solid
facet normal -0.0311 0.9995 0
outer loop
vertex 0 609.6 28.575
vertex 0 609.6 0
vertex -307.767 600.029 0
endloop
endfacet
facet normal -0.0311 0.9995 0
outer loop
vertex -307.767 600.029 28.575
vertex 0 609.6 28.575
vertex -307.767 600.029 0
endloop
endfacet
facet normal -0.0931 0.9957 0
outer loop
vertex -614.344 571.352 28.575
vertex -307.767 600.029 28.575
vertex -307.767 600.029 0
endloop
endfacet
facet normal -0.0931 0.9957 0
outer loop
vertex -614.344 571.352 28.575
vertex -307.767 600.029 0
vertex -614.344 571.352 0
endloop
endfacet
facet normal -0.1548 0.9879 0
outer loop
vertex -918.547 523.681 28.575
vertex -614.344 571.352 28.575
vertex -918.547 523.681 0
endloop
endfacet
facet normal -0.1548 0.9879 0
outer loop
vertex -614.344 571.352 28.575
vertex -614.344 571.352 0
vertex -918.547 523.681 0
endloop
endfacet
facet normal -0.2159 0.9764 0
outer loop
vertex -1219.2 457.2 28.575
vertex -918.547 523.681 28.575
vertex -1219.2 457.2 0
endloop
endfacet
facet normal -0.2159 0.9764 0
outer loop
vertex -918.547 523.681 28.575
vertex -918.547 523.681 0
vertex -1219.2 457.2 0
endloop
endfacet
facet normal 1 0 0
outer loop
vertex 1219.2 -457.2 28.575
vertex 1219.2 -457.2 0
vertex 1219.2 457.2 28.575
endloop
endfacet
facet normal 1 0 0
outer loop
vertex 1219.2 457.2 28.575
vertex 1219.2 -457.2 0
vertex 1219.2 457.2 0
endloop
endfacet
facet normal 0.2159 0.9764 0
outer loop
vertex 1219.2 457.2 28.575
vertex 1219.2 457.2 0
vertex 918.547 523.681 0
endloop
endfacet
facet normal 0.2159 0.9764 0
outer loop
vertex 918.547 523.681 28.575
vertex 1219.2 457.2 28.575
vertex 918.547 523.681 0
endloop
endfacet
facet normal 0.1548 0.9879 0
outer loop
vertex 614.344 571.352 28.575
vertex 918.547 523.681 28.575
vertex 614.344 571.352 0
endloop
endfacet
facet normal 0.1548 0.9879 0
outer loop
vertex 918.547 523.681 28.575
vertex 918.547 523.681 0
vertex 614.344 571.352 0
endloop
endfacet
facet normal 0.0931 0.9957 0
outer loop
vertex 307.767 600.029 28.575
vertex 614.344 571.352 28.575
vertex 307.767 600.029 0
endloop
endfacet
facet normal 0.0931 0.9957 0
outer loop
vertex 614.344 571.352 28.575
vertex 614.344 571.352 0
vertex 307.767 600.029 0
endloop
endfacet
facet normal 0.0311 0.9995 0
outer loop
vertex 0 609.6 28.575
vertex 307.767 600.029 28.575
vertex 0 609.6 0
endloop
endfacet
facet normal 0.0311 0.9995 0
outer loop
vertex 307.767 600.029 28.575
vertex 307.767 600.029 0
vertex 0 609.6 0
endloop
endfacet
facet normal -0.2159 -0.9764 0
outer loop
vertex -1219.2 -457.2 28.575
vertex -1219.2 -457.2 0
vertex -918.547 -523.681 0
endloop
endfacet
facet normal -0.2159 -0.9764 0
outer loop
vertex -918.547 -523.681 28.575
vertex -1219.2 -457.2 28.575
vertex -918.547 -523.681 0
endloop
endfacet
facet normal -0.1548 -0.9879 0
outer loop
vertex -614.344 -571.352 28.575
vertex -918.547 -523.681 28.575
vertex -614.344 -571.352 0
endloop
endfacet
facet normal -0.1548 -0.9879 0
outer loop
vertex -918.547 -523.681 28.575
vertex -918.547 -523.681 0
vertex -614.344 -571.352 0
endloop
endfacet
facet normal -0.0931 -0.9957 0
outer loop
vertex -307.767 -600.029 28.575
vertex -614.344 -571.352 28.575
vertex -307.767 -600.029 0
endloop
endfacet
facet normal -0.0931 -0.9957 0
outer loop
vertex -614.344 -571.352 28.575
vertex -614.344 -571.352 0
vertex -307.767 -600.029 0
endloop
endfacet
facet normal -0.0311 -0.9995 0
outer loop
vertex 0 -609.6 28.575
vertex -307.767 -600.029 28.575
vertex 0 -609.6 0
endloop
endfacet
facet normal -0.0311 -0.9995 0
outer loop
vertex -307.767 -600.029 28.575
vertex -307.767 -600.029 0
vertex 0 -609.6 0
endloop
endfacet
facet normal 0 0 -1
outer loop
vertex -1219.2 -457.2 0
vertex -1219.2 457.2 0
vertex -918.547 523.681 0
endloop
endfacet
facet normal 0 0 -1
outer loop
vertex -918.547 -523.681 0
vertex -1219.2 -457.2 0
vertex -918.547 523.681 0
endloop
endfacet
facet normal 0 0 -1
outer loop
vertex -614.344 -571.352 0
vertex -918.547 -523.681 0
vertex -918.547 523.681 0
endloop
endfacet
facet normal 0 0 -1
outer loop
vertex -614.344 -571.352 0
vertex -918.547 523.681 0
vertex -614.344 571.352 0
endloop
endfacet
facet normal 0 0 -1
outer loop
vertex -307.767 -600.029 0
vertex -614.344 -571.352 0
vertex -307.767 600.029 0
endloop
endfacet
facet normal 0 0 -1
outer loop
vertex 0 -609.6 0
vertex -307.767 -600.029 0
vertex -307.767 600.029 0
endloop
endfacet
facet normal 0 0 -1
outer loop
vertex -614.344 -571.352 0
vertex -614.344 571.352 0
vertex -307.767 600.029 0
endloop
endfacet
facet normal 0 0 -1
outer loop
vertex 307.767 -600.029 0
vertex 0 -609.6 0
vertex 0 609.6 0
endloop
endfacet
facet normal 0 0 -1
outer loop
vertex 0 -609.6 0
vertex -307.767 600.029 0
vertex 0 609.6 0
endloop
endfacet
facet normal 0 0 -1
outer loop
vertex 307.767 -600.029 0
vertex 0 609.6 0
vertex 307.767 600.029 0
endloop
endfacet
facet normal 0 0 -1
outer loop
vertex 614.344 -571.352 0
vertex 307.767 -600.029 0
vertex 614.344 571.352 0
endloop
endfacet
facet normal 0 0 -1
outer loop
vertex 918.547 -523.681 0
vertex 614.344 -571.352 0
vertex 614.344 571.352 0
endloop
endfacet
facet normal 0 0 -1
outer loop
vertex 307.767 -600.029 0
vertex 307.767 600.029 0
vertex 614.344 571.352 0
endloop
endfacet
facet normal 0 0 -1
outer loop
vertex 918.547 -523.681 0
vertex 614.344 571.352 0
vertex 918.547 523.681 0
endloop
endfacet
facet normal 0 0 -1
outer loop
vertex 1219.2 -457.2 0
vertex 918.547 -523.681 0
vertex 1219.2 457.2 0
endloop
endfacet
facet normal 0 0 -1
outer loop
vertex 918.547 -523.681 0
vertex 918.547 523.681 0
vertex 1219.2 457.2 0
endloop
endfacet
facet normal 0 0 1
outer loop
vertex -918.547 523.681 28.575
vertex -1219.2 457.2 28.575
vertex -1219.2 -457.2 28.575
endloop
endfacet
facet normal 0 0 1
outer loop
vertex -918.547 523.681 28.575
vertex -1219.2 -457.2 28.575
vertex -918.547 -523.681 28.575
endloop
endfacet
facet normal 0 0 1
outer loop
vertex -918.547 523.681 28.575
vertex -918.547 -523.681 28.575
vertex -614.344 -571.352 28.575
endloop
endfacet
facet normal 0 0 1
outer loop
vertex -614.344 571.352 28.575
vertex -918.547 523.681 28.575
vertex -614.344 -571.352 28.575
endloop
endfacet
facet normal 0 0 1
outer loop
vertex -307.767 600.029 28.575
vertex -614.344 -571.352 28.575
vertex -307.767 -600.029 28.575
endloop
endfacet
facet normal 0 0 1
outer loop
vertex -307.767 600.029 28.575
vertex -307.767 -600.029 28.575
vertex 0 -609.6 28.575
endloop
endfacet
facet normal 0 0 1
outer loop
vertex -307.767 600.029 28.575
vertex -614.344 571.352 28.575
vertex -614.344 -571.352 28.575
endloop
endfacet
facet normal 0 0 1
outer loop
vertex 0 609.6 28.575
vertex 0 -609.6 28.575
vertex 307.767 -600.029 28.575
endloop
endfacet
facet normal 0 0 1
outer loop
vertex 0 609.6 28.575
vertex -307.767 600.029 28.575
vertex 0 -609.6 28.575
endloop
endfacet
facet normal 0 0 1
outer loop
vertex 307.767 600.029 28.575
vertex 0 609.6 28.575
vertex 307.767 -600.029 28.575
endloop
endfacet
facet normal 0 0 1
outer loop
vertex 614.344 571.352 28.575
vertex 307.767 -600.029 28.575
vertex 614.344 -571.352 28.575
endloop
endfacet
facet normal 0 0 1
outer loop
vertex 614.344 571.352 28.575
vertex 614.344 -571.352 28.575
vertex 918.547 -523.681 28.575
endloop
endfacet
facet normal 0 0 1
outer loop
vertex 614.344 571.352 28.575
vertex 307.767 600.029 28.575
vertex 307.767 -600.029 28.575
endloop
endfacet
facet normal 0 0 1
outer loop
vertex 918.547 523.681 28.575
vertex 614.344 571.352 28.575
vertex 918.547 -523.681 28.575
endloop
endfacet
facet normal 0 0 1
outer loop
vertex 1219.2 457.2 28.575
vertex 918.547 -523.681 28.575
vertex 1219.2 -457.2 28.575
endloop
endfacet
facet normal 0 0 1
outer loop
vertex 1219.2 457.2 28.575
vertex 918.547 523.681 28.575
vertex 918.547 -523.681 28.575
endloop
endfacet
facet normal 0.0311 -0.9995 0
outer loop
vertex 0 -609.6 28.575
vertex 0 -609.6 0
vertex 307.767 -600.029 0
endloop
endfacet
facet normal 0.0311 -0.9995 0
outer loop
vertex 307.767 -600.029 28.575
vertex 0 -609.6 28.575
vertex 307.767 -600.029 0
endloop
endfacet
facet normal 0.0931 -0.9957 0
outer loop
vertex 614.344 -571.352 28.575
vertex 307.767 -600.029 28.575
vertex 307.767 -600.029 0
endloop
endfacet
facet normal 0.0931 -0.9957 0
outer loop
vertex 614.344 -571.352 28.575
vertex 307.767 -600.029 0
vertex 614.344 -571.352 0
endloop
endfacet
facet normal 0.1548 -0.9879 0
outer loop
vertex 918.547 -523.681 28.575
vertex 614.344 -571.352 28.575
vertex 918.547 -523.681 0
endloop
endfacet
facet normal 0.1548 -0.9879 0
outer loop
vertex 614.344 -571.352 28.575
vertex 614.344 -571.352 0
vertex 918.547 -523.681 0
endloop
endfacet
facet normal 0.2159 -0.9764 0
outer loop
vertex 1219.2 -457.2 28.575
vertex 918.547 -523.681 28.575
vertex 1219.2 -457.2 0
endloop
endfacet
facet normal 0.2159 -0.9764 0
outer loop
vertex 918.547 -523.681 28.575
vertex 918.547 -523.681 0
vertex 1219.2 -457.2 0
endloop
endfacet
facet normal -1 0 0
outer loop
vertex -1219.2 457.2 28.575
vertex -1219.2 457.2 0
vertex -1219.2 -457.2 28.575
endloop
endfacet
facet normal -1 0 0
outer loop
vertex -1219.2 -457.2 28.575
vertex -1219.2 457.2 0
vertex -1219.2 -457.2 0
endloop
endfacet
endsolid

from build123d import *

# Parameters (mm, degrees)
F1_DEPTH = 28.575


with BuildPart() as f1:
    # F0 (on Top) → F1 (new body)
    with BuildSketch(Plane.XY):
        with BuildLine():
            Line((-1219.2, 457.2), (0, 457.2))
            Line((0, 457.2), (0, 609.6))
            ThreePointArc((0, 609.6), (-614.34404, 571.352323), (-1219.2, 457.2))
        make_face()
        with BuildLine():
            Line((0, 457.2), (1219.2, 457.2))
            ThreePointArc((1219.2, 457.2), (614.34404, 571.352323), (0, 609.6))
            Line((0, 609.6), (0, 457.2))
        make_face()
        Polygon((0, 0), (0, 457.2), (-1219.2, 457.2), (-1219.2, -457.2), (0, -457.2), align=None)
        Polygon((1219.2, -457.2), (1219.2, 457.2), (0, 457.2), (0, 0), (0, -457.2), align=None)
        with BuildLine():
            Line((0, -609.6), (0, -457.2))
            Line((0, -457.2), (-1219.2, -457.2))
            ThreePointArc((-1219.2, -457.2), (-614.34404, -571.352323), (0, -609.6))
        make_face()
        with BuildLine():
            ThreePointArc((0, -609.6), (614.34404, -571.352323), (1219.2, -457.2))
            Line((1219.2, -457.2), (0, -457.2))
            Line((0, -457.2), (0, -609.6))
        make_face()
    extrude(amount=F1_DEPTH)


solid = f1.part
